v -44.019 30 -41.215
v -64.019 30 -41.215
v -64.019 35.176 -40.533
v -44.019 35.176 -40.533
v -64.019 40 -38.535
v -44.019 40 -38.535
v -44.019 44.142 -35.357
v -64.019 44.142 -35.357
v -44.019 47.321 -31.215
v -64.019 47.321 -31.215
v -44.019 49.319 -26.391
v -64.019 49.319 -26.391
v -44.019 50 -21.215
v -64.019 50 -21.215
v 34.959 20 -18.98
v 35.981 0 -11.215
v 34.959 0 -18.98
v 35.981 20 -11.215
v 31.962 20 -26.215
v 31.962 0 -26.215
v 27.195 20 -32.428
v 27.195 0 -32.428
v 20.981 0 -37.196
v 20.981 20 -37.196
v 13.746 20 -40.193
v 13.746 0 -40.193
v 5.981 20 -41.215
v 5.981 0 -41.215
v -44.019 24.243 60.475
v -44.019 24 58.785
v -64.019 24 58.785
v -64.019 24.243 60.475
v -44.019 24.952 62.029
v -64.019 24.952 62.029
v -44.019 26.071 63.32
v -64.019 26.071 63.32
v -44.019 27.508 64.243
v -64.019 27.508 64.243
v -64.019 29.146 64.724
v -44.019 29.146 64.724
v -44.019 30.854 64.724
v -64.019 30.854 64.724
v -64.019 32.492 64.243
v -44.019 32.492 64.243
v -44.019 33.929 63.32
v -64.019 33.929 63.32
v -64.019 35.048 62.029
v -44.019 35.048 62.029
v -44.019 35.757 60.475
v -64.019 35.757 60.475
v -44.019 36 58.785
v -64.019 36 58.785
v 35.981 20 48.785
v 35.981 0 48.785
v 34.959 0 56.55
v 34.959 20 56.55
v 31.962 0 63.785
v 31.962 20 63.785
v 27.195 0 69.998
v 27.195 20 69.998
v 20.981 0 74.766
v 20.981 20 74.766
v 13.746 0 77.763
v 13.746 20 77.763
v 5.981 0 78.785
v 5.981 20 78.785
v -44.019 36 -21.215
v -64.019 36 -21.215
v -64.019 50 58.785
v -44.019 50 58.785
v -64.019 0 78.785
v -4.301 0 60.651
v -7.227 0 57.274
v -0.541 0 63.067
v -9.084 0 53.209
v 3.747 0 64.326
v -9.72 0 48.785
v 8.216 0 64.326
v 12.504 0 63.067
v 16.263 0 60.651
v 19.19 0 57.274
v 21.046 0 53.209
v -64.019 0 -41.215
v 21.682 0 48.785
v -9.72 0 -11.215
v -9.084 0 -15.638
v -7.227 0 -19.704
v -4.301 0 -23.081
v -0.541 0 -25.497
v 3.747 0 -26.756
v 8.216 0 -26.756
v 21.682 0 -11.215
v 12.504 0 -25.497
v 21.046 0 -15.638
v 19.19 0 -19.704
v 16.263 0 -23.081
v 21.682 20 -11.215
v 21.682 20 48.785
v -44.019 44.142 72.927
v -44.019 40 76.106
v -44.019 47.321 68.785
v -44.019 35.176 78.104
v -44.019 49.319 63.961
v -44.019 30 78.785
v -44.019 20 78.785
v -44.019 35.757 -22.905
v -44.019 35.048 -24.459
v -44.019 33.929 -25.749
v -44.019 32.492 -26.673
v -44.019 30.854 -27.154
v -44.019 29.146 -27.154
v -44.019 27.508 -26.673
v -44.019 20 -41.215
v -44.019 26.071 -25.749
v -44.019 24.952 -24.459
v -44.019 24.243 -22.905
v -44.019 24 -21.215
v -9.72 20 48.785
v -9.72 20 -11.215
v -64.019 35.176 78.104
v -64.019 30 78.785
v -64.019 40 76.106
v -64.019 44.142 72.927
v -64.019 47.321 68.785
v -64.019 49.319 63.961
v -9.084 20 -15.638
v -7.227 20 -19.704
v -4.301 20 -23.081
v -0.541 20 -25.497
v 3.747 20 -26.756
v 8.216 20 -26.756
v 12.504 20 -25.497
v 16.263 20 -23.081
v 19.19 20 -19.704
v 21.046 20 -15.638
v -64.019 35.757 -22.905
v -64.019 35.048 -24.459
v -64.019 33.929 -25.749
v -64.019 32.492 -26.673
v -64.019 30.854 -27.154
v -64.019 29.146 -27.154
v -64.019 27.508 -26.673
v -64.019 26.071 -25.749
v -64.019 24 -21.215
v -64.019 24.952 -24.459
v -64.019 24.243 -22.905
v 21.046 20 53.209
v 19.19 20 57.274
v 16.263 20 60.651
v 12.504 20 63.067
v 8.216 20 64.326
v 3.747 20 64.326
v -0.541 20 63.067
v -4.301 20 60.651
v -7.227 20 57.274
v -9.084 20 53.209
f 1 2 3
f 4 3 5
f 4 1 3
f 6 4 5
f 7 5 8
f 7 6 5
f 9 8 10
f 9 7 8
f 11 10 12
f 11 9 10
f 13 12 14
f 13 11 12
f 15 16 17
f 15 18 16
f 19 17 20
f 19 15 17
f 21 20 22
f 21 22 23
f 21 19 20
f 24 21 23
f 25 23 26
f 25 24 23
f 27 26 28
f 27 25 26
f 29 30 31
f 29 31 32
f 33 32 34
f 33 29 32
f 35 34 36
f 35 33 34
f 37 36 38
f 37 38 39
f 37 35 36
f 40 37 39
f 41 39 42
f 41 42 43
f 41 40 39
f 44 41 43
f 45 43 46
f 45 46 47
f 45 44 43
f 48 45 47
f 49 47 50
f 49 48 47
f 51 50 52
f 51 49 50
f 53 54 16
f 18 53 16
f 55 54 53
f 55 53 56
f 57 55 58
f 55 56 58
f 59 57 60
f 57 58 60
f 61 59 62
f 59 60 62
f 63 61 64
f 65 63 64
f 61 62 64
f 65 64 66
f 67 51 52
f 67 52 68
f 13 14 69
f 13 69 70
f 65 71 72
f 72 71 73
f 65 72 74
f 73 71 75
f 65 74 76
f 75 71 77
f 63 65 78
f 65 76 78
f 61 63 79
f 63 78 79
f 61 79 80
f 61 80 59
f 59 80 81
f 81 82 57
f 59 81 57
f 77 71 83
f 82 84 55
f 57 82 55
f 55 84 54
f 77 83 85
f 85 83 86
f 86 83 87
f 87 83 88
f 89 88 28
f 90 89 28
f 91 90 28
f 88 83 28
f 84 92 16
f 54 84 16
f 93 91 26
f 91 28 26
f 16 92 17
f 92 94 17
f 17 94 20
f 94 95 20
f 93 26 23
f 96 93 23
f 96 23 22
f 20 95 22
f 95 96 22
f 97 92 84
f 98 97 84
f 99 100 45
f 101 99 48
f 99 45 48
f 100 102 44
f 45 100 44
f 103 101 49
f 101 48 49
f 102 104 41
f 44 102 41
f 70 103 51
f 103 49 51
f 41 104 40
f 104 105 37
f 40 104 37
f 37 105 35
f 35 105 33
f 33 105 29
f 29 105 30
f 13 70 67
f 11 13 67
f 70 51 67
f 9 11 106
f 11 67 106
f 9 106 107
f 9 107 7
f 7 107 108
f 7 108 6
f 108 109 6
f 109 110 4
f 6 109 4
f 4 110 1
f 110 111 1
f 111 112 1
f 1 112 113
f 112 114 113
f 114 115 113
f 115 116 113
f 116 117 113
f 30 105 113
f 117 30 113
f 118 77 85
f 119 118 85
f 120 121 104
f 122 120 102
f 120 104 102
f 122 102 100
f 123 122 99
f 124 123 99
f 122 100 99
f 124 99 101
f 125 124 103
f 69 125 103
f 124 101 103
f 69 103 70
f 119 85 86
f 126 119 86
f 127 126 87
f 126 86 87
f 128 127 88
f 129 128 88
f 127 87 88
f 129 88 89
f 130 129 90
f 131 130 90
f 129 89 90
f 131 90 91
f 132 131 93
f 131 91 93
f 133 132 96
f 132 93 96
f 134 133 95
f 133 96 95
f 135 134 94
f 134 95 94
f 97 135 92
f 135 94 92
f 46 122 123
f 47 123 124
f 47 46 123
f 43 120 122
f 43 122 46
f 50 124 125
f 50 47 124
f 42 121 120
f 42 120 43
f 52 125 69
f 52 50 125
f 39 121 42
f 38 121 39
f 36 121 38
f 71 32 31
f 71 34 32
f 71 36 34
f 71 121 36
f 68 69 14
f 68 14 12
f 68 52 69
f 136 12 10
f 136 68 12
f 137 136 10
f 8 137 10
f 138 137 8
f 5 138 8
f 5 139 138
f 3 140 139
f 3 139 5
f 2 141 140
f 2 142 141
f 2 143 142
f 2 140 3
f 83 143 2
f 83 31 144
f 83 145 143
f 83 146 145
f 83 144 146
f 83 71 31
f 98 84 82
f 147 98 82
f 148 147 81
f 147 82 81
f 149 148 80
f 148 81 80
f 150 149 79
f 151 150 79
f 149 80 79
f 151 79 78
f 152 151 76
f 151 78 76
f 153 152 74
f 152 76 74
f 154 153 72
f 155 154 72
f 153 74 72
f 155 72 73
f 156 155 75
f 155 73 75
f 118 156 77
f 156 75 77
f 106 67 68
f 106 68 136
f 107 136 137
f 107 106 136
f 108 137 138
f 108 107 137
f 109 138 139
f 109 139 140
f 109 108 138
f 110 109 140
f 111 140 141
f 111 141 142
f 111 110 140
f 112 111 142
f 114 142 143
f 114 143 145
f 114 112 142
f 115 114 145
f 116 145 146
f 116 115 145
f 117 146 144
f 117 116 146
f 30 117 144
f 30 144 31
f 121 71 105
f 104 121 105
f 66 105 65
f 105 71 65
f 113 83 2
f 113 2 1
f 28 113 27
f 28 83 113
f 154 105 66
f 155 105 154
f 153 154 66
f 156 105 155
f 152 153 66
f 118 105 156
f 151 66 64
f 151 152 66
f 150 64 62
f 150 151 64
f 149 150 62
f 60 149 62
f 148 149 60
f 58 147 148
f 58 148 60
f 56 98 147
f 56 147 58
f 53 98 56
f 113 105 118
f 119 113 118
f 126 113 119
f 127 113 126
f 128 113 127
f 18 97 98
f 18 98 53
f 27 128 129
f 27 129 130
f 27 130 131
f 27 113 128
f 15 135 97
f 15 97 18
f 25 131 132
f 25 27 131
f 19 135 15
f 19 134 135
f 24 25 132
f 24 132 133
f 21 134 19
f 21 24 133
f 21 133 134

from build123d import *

# Parameters (mm, degrees)
IZIM2_W                     = 80
IZIM2_H                     = 120
IZIM2_W_2                   = 20
Y_KSEKLIK_EKSTR_ZYON3_DEPTH = 20
RADYUS1_R                   = 30
IZIM3_W                     = 20
IZIM3_H                     = 120
EKSTR_ZYON_NCE1_DEPTH       = 50
RADYUS2_R                   = 20
KES_EKSTR_ZYON3_DEPTH       = 20


with BuildPart() as part:
    # Çizim2 → Yükseklik-Ekstrüzyon3 (new body)
    # profile 1 of 2: a face of its own
    with BuildSketch(Plane(origin=(0, 0, 0), x_dir=(1, 0, 0), z_dir=(0, 1, 0))):
        with Locations((-4.018691589, -18.785046729)):
            Rectangle(IZIM2_W, IZIM2_H)
        with BuildLine():
            ThreePointArc((-9.719626168, 11.214953271), (5.981308411, 26.91588785), (21.682242991, 11.214953271))
            Line((21.682242991, 11.214953271), (21.682242991, -48.785046729))
            ThreePointArc((21.682242991, -48.785046729), (5.981308411, -64.485981308), (-9.719626168, -48.785046729))
            Line((-9.719626168, -48.785046729), (-9.719626168, 11.214953271))
        make_face(mode=Mode.SUBTRACT)
    # profile 2 of 2: a face of its own
    with BuildSketch(Plane(origin=(0, 0, 0), x_dir=(1, 0, 0), z_dir=(0, 1, 0))):
        with Locations((-54.018691589, -18.785046729)):
            Rectangle(IZIM2_W_2, IZIM2_H)
    extrude(amount=Y_KSEKLIK_EKSTR_ZYON3_DEPTH)

    # Radyus1
    radyus1_edges = [part.edges().sort_by_distance(p)[0] for p in [
        (35.981308411, 10, -41.214953271),
        (35.981308411, 10, 78.785046729),
    ]]
    fillet(radyus1_edges, radius=RADYUS1_R)

    # Çizim3 → Ekstrüzyon-İnce1 (add)
    with BuildSketch(Plane(origin=(0, 0, 0), x_dir=(1, 0, 0), z_dir=(0, 1, 0))):
        with Locations((-54.018691589, -18.785046729)):
            Rectangle(IZIM3_W, IZIM3_H)
    extrude(amount=EKSTR_ZYON_NCE1_DEPTH)

    # Radyus2
    radyus2_edges = [part.edges().sort_by_distance(p)[0] for p in [
        (-54.018691589, 50, 78.785046729),
        (-54.018691589, 50, -41.214953271),
    ]]
    fillet(radyus2_edges, radius=RADYUS2_R)

    # Çizim6 → Kes-Ekstrüzyon3 (cut)
    with BuildSketch(Plane(origin=(-44.018691589, 0, 0), x_dir=(0, 0, -1), z_dir=(1, 0, 0))):
        with BuildLine():
            Line((-58.785046729, 36), (21.214953271, 36))
            ThreePointArc((21.214953271, 36), (27.214953271, 30), (21.214953271, 24))
            Line((21.214953271, 24), (-58.785046729, 24))
            ThreePointArc((-58.785046729, 24), (-64.785046729, 30), (-58.785046729, 36))
        make_face()
    extrude(amount=-KES_EKSTR_ZYON3_DEPTH, mode=Mode.SUBTRACT)


solid = part.part
